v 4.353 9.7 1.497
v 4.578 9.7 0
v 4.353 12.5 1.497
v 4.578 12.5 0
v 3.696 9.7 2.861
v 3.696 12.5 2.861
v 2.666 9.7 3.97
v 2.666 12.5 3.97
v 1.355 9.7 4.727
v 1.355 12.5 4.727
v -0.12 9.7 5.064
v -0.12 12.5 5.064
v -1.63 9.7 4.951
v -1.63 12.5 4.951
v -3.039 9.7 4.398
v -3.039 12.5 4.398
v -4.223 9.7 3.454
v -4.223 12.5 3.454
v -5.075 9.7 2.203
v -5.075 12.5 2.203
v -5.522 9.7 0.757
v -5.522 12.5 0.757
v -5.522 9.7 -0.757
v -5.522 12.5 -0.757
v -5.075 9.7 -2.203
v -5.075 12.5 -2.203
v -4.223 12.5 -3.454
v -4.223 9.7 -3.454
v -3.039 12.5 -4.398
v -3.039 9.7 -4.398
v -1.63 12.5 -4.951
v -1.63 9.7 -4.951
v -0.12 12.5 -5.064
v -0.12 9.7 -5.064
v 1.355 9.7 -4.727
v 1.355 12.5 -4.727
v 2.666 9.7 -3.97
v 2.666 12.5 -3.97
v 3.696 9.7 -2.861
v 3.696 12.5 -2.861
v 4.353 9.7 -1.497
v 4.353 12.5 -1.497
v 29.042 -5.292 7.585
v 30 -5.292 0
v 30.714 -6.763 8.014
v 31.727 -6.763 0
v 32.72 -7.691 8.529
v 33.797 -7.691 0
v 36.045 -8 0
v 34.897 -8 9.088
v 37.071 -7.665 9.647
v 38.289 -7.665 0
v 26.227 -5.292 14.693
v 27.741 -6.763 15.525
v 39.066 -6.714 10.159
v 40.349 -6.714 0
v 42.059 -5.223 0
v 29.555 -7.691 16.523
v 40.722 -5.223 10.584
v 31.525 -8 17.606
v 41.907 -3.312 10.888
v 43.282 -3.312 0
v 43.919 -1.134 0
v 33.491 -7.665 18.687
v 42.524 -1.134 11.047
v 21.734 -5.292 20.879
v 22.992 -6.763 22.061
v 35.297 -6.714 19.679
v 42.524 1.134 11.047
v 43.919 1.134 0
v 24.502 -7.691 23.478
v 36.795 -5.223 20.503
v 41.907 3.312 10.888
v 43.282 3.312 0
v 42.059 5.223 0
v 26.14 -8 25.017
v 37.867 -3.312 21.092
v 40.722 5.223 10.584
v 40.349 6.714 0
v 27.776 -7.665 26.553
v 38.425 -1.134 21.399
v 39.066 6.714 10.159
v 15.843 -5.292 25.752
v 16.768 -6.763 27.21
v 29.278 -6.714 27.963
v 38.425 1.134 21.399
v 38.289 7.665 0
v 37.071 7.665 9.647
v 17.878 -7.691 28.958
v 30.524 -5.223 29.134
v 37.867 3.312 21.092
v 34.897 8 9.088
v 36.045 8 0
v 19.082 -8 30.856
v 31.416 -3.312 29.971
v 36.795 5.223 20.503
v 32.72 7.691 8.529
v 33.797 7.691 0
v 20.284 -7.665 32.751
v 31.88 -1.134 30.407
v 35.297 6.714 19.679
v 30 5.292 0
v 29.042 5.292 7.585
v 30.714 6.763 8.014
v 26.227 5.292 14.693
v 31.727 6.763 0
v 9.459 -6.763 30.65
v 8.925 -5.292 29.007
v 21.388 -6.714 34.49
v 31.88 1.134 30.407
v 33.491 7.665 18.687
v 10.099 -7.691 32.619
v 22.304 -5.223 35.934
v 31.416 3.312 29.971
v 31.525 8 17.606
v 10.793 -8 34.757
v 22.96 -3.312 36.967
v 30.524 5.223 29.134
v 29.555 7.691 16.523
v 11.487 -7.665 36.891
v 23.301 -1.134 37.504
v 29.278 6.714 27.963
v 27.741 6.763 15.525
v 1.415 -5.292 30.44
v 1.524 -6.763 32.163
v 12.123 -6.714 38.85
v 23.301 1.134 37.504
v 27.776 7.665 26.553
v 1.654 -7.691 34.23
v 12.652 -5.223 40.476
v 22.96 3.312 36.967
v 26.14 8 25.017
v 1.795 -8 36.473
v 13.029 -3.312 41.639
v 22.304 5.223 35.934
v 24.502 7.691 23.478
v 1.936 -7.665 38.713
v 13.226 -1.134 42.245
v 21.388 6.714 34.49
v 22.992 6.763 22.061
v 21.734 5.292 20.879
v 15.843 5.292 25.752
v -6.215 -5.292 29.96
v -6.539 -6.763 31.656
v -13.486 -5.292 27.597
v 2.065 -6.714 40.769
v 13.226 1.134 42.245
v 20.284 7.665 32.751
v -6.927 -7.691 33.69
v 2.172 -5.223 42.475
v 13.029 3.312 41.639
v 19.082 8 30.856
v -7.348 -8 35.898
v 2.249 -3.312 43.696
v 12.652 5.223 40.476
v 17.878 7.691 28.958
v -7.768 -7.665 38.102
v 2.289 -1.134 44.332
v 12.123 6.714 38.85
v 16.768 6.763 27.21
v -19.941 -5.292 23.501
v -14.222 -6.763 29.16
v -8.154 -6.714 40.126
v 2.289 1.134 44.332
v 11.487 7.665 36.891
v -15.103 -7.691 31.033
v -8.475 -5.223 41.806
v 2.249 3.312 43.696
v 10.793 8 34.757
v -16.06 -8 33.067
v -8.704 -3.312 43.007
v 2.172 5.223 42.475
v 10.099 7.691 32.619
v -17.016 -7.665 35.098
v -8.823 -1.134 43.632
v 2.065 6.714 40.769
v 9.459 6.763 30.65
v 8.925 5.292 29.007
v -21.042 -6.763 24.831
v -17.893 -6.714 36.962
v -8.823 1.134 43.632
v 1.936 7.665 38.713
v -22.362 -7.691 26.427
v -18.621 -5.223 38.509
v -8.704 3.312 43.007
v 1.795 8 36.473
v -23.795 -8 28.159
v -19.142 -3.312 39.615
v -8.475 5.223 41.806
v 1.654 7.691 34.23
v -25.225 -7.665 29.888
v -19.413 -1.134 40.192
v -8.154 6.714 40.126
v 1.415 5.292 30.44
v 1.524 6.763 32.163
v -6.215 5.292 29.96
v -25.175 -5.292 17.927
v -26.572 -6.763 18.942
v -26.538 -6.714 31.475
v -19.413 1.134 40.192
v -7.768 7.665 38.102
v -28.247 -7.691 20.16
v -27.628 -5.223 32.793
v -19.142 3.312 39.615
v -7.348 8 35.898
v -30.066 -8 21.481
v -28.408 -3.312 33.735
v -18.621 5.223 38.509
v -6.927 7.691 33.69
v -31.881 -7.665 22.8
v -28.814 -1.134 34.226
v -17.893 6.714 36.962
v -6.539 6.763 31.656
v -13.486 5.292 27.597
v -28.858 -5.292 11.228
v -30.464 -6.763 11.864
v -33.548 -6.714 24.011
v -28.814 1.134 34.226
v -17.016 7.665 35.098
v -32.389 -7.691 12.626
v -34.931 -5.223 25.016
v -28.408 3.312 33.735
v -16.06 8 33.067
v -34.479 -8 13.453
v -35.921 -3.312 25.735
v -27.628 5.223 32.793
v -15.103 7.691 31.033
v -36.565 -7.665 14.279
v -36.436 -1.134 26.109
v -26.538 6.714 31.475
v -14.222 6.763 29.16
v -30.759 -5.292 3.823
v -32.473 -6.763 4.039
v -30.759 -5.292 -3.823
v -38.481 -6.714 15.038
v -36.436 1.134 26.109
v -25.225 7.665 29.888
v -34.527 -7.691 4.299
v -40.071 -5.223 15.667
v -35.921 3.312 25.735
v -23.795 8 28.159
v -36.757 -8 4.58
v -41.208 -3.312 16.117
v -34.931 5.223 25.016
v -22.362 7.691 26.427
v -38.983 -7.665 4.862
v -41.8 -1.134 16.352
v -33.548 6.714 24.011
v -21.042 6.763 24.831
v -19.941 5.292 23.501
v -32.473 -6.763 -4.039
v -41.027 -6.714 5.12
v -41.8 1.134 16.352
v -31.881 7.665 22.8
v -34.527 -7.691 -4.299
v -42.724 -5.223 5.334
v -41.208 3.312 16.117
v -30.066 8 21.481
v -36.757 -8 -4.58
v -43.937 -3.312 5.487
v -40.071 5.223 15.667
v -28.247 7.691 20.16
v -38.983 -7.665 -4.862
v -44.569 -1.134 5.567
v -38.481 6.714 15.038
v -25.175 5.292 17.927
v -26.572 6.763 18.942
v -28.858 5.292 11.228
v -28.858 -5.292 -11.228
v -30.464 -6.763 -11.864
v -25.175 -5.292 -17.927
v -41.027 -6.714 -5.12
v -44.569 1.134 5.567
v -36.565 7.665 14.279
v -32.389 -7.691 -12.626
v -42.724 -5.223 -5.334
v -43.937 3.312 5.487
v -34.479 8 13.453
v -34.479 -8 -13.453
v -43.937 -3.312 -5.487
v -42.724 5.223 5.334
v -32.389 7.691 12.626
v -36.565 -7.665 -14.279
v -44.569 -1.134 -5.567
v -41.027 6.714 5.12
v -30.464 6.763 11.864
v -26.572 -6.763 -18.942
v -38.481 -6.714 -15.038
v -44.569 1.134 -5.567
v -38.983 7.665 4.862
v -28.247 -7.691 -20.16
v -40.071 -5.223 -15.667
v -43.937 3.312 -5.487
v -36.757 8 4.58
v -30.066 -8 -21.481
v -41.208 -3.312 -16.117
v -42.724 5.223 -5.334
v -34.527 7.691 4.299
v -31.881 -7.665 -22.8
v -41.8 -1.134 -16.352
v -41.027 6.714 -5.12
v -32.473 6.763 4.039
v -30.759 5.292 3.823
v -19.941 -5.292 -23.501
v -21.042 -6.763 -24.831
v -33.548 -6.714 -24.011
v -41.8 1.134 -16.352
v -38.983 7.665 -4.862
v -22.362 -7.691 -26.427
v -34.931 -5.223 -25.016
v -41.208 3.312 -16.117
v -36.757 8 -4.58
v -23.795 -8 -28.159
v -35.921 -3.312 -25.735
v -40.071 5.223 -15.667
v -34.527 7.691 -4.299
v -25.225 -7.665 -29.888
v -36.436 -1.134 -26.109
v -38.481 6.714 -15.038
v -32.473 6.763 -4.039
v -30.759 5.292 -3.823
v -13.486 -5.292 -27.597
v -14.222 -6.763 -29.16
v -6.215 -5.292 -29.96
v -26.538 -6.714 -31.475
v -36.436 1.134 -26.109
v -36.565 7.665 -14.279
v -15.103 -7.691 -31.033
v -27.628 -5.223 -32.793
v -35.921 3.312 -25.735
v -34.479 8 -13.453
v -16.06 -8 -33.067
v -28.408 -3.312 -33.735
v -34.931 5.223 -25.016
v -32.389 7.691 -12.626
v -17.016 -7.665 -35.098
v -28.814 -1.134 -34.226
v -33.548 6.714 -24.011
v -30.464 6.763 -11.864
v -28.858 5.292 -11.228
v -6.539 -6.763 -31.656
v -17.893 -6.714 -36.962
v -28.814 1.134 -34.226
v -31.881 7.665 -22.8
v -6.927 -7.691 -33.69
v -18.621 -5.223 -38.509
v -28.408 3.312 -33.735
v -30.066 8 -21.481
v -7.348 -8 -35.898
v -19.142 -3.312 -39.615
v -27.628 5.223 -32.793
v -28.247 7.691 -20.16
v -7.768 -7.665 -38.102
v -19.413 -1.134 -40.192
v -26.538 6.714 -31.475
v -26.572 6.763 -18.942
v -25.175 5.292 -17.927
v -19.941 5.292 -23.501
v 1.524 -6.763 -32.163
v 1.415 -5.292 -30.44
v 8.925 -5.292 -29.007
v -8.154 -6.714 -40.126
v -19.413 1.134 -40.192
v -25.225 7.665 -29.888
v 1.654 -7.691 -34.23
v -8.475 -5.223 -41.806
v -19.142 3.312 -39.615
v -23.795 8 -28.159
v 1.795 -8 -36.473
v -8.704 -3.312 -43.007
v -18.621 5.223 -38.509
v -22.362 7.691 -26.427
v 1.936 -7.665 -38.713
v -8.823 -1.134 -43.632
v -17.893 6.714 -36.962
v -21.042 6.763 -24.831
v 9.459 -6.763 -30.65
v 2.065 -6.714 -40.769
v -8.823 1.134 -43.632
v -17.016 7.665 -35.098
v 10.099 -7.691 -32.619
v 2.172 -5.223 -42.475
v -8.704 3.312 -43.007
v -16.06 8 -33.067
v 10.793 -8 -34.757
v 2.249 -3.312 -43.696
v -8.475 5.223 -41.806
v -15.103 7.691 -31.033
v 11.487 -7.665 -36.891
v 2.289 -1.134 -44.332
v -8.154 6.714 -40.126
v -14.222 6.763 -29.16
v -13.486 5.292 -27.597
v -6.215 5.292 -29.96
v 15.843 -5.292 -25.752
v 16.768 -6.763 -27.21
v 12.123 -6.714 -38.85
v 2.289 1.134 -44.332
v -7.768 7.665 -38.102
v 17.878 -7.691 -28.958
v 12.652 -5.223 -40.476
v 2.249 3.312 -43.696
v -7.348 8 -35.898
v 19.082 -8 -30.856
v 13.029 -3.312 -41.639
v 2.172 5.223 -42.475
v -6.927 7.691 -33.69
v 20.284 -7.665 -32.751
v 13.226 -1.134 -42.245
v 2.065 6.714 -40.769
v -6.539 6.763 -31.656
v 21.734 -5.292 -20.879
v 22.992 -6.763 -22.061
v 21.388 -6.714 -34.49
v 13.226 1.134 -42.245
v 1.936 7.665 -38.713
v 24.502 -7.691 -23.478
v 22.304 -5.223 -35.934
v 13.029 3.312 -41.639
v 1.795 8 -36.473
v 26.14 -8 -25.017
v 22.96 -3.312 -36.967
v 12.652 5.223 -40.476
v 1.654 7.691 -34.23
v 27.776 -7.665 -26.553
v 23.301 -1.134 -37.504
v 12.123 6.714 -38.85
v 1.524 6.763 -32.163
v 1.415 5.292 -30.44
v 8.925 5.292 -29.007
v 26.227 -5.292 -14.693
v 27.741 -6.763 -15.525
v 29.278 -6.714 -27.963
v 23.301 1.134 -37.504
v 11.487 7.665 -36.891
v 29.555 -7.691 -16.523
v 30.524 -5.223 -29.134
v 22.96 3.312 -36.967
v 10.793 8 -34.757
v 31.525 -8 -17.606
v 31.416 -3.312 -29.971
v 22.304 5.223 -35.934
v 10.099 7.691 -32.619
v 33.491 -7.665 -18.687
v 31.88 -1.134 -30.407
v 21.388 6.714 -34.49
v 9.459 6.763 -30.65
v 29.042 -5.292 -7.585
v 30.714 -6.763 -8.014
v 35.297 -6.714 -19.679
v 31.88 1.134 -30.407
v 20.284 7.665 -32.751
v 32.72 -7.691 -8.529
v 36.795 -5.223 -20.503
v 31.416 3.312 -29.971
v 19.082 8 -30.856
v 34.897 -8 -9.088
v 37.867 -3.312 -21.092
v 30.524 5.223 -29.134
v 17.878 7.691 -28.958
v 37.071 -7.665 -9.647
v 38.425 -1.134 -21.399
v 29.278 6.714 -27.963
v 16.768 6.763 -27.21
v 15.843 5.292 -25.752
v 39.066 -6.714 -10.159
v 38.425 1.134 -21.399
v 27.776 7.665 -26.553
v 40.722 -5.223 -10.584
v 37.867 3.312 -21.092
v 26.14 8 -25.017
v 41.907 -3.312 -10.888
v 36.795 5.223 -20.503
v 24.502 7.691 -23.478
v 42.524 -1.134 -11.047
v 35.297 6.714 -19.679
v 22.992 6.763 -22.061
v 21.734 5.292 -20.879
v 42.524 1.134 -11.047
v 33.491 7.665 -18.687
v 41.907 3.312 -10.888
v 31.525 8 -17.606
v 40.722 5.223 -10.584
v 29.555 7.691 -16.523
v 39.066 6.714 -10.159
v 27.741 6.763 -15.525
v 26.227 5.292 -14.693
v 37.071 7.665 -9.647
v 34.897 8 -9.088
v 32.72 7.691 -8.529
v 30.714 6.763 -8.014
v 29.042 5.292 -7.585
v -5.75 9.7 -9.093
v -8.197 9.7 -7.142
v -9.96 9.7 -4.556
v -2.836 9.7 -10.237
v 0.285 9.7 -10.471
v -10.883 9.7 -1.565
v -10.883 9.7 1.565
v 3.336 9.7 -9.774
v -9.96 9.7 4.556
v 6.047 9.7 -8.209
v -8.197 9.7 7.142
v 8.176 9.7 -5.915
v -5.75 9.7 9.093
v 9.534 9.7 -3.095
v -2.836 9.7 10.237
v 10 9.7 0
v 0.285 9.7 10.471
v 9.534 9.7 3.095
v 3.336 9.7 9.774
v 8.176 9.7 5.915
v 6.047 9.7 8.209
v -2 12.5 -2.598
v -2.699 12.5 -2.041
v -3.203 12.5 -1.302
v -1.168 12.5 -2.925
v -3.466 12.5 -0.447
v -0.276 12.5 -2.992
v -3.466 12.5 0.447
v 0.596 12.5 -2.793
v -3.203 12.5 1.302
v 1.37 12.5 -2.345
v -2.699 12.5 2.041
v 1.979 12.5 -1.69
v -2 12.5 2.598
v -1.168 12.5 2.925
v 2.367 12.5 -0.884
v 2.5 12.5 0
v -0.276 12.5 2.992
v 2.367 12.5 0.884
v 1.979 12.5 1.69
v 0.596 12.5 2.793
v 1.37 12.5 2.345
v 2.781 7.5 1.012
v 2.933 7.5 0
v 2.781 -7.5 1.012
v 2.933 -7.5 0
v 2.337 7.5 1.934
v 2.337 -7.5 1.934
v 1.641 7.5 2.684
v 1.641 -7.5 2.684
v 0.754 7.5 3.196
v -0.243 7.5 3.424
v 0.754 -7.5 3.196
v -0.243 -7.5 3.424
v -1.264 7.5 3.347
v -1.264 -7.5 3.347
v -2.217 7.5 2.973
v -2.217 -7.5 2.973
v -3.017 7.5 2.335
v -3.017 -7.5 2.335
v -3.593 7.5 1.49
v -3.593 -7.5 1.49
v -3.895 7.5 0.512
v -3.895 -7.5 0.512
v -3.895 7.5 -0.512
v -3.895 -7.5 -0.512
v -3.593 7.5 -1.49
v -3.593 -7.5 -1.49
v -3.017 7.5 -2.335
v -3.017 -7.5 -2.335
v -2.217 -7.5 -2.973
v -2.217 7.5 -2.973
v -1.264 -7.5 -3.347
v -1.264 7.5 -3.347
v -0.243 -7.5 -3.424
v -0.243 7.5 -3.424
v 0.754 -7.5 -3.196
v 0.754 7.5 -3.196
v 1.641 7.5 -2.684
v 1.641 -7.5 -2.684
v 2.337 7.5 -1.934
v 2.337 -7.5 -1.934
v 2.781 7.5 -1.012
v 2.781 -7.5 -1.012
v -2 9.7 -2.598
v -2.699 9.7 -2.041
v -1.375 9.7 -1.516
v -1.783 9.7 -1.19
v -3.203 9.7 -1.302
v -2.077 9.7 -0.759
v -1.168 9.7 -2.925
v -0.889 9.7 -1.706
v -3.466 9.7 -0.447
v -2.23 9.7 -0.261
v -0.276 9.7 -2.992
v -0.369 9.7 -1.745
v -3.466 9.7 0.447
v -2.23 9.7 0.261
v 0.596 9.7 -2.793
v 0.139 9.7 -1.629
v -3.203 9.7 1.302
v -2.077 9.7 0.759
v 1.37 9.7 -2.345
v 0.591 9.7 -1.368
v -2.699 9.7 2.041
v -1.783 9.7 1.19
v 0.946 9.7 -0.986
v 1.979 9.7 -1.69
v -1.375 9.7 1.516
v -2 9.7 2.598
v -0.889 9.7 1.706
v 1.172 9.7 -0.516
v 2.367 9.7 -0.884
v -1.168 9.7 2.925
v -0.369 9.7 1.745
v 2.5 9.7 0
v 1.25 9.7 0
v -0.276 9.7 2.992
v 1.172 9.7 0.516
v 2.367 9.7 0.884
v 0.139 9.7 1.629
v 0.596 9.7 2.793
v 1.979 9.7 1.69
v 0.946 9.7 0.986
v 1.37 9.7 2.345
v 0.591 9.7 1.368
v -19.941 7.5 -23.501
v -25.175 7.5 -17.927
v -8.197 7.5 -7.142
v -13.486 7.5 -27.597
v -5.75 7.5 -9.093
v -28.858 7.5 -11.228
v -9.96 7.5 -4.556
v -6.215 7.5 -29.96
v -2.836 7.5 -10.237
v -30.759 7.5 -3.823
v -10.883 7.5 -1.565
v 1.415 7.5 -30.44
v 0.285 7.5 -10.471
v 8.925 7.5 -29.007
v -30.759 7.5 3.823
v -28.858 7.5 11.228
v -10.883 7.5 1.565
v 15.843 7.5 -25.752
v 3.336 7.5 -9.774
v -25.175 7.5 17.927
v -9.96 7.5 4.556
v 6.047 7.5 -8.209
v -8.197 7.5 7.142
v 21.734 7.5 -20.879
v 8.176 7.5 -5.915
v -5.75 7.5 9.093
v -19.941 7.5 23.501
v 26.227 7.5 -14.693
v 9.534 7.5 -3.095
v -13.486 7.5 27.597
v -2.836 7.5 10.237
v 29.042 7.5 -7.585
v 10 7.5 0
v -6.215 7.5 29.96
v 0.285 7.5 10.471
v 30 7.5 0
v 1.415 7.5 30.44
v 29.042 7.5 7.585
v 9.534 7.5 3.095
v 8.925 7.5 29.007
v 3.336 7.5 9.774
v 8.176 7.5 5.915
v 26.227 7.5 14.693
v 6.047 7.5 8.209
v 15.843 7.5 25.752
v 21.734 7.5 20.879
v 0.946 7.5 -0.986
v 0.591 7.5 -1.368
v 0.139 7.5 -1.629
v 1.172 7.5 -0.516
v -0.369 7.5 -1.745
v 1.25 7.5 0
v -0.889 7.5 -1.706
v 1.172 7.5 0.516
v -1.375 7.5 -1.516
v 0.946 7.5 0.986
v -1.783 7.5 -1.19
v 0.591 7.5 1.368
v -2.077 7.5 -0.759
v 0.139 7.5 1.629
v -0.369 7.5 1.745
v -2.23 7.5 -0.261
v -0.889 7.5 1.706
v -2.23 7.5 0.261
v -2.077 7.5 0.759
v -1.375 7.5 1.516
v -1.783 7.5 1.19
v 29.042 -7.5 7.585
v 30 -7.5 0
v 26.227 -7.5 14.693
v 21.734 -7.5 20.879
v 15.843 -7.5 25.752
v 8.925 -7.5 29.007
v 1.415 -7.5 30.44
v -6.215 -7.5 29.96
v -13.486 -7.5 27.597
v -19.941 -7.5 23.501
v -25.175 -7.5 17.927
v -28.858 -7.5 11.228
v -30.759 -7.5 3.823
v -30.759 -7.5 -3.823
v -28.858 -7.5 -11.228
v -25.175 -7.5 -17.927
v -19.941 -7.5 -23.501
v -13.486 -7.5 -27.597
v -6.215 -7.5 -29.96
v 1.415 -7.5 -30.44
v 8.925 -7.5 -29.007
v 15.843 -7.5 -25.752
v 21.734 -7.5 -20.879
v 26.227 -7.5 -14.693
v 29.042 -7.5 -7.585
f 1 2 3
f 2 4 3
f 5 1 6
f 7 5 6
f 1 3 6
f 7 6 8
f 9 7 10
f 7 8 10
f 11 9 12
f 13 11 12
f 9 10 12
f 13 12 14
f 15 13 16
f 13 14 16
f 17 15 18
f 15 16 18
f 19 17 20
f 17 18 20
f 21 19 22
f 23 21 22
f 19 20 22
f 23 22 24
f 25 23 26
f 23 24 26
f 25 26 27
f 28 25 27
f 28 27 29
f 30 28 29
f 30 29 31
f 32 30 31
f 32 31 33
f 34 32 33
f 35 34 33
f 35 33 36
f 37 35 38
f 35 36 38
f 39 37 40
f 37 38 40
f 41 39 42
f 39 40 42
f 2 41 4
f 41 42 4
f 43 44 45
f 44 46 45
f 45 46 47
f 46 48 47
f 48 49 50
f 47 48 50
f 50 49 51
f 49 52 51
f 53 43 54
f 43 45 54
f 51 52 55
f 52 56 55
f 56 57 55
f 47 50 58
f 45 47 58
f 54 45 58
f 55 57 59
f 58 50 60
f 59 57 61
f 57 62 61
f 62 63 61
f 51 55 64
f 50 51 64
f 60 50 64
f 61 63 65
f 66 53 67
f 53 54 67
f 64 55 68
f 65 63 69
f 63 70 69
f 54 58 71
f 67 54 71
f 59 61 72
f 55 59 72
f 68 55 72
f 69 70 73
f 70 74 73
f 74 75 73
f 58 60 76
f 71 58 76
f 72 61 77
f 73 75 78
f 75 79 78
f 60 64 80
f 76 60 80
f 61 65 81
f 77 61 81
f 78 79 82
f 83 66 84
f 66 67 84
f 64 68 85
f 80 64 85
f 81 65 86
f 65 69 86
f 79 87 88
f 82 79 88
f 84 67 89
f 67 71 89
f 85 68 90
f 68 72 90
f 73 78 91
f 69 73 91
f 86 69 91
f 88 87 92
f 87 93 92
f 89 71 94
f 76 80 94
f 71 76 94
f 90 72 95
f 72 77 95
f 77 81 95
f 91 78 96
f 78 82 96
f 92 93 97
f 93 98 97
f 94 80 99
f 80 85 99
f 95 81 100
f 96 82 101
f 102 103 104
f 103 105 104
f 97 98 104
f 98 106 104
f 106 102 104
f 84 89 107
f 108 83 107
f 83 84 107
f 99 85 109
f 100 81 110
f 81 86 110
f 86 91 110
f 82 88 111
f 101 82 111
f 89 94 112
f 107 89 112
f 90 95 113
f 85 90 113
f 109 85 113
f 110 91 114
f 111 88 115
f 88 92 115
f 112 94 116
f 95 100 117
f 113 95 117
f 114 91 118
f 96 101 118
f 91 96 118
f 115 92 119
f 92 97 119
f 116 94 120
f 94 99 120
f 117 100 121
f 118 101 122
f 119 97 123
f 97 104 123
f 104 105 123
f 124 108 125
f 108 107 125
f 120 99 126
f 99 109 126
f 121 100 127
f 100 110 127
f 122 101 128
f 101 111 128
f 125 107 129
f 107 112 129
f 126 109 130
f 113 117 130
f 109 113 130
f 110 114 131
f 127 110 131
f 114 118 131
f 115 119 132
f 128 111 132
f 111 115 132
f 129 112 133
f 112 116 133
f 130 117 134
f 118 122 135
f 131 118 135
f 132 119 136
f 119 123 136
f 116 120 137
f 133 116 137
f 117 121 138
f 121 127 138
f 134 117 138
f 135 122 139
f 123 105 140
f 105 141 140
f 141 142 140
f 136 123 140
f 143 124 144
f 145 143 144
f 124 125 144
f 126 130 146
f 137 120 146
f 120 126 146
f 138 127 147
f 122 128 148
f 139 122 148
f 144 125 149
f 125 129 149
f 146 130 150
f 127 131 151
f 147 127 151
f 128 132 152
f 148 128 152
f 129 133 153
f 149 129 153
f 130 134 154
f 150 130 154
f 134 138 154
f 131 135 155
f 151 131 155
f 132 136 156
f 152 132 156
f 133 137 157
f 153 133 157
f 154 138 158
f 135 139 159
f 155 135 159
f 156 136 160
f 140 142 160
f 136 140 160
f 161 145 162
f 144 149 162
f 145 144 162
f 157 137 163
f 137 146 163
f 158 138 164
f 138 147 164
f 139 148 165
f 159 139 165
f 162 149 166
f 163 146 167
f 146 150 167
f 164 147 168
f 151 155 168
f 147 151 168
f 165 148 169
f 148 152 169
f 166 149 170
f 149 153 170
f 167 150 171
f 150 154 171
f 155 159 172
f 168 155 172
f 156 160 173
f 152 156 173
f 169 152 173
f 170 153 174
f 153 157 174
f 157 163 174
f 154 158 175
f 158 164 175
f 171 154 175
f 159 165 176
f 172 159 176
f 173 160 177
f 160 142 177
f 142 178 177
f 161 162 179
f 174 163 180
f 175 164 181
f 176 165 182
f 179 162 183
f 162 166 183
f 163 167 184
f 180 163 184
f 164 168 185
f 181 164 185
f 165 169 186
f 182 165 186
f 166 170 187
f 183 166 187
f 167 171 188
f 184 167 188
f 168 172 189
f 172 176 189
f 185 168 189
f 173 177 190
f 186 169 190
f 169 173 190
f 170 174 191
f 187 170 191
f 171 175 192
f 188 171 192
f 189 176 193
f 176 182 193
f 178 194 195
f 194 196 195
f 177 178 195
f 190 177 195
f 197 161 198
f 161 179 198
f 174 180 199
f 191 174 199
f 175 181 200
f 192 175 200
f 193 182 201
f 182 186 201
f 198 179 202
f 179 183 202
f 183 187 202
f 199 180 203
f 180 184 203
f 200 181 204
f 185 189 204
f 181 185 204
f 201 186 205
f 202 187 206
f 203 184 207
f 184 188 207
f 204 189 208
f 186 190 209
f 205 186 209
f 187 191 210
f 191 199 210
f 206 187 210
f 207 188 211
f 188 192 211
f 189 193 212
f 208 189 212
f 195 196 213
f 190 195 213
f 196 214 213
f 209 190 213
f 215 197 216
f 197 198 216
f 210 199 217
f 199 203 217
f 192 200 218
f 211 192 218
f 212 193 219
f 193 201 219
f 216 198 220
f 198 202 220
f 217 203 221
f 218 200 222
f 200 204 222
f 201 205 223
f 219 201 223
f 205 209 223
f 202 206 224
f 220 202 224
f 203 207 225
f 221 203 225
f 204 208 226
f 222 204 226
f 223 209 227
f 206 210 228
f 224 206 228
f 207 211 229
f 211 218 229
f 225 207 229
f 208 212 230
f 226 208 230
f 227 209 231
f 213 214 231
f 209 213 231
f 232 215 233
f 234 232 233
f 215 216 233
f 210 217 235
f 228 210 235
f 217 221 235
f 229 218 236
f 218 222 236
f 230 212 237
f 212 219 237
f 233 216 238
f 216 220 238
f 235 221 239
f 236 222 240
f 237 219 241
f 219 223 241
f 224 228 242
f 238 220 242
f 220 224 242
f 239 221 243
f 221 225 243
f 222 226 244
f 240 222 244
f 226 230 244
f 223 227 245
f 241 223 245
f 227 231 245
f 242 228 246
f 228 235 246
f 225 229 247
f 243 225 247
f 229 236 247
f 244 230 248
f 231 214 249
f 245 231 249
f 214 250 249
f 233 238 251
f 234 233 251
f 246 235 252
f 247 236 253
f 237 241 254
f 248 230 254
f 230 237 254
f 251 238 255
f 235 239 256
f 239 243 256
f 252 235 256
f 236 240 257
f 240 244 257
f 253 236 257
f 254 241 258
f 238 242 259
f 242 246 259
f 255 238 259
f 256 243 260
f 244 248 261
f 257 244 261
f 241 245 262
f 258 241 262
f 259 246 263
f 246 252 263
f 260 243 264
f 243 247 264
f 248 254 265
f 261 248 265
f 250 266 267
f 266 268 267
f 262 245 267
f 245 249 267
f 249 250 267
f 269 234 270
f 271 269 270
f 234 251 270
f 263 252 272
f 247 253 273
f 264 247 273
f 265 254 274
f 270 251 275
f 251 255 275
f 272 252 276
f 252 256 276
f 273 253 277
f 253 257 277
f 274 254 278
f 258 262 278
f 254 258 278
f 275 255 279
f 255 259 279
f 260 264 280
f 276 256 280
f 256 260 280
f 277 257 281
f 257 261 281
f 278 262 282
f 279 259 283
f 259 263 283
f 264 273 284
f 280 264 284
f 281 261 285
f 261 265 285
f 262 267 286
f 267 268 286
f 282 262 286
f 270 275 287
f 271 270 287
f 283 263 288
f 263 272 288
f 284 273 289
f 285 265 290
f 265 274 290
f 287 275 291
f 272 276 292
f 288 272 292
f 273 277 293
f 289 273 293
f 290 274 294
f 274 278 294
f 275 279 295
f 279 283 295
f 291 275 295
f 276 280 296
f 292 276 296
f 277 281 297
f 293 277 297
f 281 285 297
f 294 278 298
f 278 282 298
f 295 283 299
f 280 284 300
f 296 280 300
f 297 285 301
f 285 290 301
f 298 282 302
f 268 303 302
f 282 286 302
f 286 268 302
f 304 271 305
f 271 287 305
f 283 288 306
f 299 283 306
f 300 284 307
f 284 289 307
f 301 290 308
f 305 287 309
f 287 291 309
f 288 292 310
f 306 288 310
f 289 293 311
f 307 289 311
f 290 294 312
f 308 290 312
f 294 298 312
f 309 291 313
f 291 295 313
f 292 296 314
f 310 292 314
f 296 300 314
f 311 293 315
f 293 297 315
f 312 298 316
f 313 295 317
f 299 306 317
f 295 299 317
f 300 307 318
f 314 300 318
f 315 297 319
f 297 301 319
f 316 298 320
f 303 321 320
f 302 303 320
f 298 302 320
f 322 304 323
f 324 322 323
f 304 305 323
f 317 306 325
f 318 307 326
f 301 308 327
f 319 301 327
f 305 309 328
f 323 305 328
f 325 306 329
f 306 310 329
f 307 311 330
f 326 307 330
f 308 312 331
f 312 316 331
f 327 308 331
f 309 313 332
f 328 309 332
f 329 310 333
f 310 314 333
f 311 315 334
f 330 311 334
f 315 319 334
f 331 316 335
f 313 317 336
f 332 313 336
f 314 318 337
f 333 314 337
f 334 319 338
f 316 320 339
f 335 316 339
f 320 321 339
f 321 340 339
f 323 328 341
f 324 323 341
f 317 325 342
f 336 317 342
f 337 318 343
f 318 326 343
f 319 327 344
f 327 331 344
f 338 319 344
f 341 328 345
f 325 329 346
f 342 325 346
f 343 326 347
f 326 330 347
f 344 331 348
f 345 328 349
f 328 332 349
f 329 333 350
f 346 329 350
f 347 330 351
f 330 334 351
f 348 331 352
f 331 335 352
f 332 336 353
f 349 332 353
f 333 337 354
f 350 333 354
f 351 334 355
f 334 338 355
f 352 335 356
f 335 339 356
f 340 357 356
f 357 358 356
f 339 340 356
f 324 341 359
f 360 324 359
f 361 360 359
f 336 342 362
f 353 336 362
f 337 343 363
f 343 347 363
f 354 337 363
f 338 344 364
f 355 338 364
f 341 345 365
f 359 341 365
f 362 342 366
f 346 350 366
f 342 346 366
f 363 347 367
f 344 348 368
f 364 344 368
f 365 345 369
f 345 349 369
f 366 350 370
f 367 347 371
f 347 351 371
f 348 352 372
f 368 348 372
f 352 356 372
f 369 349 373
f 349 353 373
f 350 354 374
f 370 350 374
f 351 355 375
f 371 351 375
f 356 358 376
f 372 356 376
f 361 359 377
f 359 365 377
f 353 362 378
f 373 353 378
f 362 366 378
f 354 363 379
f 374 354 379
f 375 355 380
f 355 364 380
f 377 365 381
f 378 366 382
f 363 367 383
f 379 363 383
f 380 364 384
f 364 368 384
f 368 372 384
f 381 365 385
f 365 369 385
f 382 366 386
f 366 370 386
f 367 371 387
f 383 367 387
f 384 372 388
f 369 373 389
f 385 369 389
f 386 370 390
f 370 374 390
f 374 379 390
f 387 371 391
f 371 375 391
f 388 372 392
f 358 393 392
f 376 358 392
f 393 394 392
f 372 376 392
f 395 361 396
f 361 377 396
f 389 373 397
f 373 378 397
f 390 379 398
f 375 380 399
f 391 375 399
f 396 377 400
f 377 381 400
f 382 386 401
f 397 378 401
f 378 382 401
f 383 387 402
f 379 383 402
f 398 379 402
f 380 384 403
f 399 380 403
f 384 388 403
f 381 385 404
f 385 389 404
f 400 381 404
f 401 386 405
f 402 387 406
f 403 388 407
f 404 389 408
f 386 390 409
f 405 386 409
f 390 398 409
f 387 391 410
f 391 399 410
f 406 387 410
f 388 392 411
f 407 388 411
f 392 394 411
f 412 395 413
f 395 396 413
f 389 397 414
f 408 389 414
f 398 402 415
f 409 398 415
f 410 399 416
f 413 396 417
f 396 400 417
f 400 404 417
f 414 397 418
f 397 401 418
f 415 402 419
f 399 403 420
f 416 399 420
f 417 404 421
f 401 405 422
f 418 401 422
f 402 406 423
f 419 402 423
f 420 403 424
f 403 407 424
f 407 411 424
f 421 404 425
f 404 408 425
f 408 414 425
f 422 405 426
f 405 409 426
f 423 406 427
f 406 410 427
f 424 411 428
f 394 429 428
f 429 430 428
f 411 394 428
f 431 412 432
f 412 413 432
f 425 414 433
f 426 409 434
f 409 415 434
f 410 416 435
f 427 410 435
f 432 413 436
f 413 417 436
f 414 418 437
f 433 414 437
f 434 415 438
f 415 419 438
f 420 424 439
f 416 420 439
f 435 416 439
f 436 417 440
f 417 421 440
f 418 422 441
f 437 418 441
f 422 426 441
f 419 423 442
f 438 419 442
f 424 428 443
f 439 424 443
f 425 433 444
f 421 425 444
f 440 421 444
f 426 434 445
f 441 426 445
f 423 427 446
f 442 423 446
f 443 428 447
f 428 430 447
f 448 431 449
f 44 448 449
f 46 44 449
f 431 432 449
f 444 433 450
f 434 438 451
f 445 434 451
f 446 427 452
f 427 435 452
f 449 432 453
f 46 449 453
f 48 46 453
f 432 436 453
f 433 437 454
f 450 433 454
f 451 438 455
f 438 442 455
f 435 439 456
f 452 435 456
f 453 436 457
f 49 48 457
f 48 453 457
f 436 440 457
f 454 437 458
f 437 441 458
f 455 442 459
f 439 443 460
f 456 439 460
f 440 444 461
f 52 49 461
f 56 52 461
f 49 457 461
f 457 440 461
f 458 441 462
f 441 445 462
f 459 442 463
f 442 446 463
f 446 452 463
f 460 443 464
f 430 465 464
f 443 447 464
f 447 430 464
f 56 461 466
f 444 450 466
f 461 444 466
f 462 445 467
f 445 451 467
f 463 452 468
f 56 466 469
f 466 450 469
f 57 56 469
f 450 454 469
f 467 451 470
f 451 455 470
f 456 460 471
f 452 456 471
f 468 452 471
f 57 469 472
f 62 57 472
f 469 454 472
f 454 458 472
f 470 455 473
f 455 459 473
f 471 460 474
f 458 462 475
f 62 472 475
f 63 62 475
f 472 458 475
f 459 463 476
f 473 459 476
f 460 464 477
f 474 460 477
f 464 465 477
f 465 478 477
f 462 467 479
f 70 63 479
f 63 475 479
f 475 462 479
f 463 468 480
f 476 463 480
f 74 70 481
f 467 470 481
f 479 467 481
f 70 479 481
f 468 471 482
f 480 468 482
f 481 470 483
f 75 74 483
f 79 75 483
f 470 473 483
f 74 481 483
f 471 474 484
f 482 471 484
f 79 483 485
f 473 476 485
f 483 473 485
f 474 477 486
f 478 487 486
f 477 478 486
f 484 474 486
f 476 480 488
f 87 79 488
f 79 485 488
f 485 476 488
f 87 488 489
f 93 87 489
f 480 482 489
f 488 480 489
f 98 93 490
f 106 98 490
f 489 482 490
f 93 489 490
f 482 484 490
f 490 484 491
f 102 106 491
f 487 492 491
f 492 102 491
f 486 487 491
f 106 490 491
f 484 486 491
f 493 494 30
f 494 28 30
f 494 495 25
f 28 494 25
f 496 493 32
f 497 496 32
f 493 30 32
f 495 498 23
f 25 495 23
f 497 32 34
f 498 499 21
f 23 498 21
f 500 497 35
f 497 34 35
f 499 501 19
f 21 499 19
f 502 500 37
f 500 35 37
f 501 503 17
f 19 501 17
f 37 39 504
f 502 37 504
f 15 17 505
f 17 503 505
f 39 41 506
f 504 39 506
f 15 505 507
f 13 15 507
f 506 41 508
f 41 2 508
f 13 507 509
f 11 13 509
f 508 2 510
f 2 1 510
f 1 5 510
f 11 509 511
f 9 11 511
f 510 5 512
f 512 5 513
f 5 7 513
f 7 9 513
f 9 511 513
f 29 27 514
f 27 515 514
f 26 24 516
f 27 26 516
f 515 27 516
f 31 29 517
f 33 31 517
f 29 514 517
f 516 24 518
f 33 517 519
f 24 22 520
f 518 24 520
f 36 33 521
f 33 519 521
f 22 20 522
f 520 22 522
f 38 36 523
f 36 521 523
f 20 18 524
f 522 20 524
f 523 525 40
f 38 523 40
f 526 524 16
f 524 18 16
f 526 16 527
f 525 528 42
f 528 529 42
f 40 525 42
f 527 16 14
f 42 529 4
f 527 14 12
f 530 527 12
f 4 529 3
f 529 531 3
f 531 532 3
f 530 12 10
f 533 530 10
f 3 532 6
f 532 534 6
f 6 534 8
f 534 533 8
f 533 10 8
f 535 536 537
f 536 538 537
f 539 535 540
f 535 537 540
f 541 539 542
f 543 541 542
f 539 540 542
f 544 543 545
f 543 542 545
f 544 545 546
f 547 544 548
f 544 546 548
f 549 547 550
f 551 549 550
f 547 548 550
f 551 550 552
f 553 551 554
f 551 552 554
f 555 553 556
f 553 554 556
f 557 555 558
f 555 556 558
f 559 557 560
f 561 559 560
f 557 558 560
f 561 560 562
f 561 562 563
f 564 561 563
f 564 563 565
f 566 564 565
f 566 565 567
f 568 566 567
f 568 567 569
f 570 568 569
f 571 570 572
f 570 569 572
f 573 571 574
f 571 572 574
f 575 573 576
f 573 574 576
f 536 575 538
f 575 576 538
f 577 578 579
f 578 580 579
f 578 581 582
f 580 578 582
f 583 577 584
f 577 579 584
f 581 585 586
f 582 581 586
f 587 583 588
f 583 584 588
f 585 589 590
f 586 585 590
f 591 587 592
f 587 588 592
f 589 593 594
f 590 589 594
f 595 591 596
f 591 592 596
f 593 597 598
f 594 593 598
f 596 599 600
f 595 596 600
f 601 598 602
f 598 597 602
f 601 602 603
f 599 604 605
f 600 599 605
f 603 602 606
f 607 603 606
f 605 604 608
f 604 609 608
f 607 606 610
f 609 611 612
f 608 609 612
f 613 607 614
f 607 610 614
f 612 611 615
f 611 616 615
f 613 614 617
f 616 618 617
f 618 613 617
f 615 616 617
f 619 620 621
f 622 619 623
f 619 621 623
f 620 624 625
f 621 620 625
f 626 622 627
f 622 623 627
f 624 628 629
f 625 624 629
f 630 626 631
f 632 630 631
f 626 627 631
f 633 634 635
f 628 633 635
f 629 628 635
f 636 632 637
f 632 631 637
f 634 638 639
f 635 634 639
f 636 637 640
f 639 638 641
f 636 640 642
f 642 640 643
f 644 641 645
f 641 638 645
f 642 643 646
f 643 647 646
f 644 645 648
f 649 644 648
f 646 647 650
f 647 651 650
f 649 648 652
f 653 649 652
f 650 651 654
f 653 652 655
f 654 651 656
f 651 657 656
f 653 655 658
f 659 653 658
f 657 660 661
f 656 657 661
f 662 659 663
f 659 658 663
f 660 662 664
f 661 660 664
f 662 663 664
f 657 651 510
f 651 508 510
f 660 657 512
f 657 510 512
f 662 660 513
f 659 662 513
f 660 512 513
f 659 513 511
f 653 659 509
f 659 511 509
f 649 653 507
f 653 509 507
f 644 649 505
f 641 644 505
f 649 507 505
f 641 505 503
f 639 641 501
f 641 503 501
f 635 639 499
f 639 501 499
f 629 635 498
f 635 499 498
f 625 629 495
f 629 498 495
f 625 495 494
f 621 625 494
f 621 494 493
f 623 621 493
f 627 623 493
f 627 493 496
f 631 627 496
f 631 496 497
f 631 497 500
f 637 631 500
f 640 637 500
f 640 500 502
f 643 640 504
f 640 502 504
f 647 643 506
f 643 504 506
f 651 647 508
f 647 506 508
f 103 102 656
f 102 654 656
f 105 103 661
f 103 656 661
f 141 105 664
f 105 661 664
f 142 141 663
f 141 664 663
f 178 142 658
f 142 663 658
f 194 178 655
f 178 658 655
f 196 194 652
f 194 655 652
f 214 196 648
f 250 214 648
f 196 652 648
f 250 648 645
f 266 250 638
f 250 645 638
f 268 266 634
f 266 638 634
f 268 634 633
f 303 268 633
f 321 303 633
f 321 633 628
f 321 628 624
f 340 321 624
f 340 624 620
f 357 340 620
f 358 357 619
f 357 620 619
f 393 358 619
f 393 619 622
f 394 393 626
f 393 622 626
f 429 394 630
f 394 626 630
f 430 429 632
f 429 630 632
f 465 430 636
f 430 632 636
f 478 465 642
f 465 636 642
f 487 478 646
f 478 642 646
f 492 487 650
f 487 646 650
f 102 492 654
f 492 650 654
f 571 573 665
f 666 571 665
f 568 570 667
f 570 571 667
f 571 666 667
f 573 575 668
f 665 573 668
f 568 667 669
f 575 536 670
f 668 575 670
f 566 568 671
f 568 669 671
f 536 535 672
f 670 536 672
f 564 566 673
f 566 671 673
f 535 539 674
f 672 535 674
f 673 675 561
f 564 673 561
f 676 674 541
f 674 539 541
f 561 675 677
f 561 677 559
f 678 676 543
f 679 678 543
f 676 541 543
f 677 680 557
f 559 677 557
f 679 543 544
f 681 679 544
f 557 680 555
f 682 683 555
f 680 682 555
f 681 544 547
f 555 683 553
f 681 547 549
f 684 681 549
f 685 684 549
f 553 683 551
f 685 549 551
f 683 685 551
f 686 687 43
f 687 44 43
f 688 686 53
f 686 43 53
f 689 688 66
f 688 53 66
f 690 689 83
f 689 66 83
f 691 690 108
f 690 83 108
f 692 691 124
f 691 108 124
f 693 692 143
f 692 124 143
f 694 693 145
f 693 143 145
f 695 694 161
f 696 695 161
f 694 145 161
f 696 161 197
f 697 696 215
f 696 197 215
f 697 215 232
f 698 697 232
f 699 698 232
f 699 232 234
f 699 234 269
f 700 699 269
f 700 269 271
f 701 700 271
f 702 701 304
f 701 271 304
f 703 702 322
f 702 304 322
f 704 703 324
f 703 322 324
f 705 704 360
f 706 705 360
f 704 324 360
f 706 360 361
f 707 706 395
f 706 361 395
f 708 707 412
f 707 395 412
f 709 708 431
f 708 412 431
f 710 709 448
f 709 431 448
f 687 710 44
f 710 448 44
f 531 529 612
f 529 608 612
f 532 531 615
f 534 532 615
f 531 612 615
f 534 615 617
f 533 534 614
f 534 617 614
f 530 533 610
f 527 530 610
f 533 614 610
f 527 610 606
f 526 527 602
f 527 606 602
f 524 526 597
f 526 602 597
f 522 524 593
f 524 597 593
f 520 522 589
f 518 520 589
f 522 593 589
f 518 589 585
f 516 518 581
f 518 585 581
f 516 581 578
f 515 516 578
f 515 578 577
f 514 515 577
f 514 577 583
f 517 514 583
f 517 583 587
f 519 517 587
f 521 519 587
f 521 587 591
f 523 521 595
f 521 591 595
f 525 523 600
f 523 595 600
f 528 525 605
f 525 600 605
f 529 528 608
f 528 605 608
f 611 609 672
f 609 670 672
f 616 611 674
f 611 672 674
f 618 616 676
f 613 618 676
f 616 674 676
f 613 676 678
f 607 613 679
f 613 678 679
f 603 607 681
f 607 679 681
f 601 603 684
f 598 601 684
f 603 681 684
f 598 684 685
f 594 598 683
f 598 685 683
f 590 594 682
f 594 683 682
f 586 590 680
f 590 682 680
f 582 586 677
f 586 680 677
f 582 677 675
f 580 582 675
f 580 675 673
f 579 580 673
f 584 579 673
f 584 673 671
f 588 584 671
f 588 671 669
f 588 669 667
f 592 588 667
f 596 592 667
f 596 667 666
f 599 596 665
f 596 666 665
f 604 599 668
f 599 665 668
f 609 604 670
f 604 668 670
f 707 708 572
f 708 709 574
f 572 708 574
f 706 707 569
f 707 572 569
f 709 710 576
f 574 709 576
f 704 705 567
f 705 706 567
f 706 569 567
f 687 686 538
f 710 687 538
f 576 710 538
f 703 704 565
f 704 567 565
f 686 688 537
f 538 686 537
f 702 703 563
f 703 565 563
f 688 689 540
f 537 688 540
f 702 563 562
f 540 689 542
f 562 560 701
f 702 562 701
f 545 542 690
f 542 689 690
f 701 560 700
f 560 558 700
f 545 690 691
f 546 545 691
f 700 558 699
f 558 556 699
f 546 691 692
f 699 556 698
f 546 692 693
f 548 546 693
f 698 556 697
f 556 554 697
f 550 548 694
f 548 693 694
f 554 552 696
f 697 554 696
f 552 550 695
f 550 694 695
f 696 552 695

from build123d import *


with BuildPart() as part:
    # Esboço1 → Revolução1 (revolve)
    with BuildSketch(Plane.XY):
        with BuildLine():
            Line((30, -7.5), (30, -5.291502622))
            ThreePointArc((30, -5.291502622), (44, 0), (30, 5.291502622))
            Line((30, 5.291502622), (30, 7.5))
            Line((30, 7.5), (10, 7.5))
            Line((10, 7.5), (10, 9.7))
            Line((10, 9.7), (4.578419127, 9.7))
            Line((4.578419127, 9.7), (4.578419127, 12.5))
            Line((4.578419127, 12.5), (2.5, 12.5))
            Line((2.5, 12.5), (2.5, 9.7))
            Line((2.5, 9.7), (1.25, 9.7))
            Line((1.25, 9.7), (1.25, 7.5))
            Line((1.25, 7.5), (2.933342737, 7.5))
            Line((2.933342737, 7.5), (2.933342737, -7.5))
            Line((2.933342737, -7.5), (30, -7.5))
        make_face()
    revolve(axis=Axis((-0.5, 9.7, 0), (0, -1, 0)))


solid = part.part
